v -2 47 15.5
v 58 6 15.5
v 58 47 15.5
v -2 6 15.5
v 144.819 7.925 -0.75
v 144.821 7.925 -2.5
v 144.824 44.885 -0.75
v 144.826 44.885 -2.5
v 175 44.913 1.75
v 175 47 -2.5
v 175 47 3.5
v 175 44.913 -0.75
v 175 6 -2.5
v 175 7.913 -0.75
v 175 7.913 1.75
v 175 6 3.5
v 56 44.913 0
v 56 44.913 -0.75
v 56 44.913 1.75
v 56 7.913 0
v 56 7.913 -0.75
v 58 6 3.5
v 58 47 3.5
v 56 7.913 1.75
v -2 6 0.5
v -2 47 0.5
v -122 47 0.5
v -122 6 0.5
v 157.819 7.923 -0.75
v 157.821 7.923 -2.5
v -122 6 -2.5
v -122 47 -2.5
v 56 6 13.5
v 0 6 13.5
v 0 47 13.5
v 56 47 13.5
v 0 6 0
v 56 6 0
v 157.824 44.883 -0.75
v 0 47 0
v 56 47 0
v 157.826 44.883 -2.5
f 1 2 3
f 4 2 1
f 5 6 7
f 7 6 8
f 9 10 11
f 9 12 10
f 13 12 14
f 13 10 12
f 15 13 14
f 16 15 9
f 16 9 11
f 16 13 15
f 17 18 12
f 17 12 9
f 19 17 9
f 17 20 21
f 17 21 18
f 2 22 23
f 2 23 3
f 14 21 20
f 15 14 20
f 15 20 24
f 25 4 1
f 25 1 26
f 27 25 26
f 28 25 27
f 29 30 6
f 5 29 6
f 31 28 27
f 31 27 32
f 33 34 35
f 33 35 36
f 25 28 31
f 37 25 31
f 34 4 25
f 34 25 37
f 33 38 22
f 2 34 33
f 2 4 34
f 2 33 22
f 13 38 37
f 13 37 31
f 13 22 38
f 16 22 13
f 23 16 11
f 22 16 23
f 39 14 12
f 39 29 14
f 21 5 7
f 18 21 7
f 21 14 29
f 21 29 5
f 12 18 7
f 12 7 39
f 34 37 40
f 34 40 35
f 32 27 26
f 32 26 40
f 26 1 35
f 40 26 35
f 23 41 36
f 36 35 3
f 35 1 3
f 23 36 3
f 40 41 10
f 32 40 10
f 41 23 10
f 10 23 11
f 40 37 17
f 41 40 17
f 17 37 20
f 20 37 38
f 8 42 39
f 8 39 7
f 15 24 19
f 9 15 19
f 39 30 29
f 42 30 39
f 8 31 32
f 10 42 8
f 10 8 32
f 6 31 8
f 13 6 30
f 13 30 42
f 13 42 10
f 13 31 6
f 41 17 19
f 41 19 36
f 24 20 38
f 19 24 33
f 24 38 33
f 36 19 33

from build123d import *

# Parameters (mm, degrees)
SKETCH032_AS_DRAWN_W                      = 36.96
SKETCH032_AS_DRAWN_H                      = 13
EXTRUDE030_DEPTH                          = 2
EXTRUDE030_ONTO_SKETCH032_ROLL_ANGLE      = -0.051214
EXTRUDE030_ONTO_SKETCH032_PITCH_ANGLE     = -0.005439
EXTRUDE030_ONTO_SKETCH032_PLACEMENT_ANGLE = 89.992627
SKETCH031_W                               = 37
SKETCH031_H                               = 2.5
EXTRUDE029_DEPTH                          = 120
SKETCH030_W                               = 56
SKETCH030_H                               = 13.5
EXTRUDE028_DEPTH                          = 41


with BuildPart() as sensorcuts:
    # Sketch032 as drawn → Extrude030 (new)
    with BuildSketch(Plane.XY):
        with Locations((-0.07, -91)):
            Rectangle(SKETCH032_AS_DRAWN_W, SKETCH032_AS_DRAWN_H)
    extrude(amount=EXTRUDE030_DEPTH)


with BuildPart() as sensorcuts_1:
    # Extrude030 onto Sketch032 roll: moved
    add(sensorcuts.part.rotate(Axis((0, 0, 0), (1, 0, 0)), EXTRUDE030_ONTO_SKETCH032_ROLL_ANGLE))


with BuildPart() as sensorcuts_2:
    # Extrude030 onto Sketch032 pitch: moved
    add(sensorcuts_1.part.rotate(Axis((0, 0, 0), (0, 1, 0)), EXTRUDE030_ONTO_SKETCH032_PITCH_ANGLE))


with BuildPart() as sensorcuts_3:
    # Extrude030 onto Sketch032 placement: moved
    add(sensorcuts_2.part.moved(Location((60.323514, 26.485707, 1.233372))).rotate(Axis((60.323514, 26.485707, 1.233372), (0, 0, 1)), EXTRUDE030_ONTO_SKETCH032_PLACEMENT_ANGLE))


with BuildPart() as sensorcuts_4:
    # Extrude030 placement: moved
    add(sensorcuts_3.part.moved(Location((0, 0, -4))))


with BuildPart() as extrude029:
    # Sketch031 → Extrude029 (new body)
    with BuildSketch(Plane.YZ.offset(56)):
        with Locations((26.412533, 0.5)):
            Rectangle(SKETCH031_W, SKETCH031_H)
    extrude(amount=EXTRUDE029_DEPTH)


with BuildPart() as band002:
    # Sketch030 → Extrude028 (new body)
    with BuildSketch(Plane.XZ.offset(-6)):
        Polygon((175, 3.5), (58, 3.5), (58, 15.5), (-2, 15.5), (-2, 0.5), (-122, 0.5), (-122, -2.5), (175, -2.5), align=None)
        with Locations((28, 6.75)):
            Rectangle(SKETCH030_W, SKETCH030_H, mode=Mode.SUBTRACT)
    extrude(amount=-EXTRUDE028_DEPTH)

    # Cut002: cut Extrude029
    add(extrude029.part, mode=Mode.SUBTRACT)

    # Cut003: cut sensorCuts
    add(sensorcuts_4.part, mode=Mode.SUBTRACT)


solid = band002.part
